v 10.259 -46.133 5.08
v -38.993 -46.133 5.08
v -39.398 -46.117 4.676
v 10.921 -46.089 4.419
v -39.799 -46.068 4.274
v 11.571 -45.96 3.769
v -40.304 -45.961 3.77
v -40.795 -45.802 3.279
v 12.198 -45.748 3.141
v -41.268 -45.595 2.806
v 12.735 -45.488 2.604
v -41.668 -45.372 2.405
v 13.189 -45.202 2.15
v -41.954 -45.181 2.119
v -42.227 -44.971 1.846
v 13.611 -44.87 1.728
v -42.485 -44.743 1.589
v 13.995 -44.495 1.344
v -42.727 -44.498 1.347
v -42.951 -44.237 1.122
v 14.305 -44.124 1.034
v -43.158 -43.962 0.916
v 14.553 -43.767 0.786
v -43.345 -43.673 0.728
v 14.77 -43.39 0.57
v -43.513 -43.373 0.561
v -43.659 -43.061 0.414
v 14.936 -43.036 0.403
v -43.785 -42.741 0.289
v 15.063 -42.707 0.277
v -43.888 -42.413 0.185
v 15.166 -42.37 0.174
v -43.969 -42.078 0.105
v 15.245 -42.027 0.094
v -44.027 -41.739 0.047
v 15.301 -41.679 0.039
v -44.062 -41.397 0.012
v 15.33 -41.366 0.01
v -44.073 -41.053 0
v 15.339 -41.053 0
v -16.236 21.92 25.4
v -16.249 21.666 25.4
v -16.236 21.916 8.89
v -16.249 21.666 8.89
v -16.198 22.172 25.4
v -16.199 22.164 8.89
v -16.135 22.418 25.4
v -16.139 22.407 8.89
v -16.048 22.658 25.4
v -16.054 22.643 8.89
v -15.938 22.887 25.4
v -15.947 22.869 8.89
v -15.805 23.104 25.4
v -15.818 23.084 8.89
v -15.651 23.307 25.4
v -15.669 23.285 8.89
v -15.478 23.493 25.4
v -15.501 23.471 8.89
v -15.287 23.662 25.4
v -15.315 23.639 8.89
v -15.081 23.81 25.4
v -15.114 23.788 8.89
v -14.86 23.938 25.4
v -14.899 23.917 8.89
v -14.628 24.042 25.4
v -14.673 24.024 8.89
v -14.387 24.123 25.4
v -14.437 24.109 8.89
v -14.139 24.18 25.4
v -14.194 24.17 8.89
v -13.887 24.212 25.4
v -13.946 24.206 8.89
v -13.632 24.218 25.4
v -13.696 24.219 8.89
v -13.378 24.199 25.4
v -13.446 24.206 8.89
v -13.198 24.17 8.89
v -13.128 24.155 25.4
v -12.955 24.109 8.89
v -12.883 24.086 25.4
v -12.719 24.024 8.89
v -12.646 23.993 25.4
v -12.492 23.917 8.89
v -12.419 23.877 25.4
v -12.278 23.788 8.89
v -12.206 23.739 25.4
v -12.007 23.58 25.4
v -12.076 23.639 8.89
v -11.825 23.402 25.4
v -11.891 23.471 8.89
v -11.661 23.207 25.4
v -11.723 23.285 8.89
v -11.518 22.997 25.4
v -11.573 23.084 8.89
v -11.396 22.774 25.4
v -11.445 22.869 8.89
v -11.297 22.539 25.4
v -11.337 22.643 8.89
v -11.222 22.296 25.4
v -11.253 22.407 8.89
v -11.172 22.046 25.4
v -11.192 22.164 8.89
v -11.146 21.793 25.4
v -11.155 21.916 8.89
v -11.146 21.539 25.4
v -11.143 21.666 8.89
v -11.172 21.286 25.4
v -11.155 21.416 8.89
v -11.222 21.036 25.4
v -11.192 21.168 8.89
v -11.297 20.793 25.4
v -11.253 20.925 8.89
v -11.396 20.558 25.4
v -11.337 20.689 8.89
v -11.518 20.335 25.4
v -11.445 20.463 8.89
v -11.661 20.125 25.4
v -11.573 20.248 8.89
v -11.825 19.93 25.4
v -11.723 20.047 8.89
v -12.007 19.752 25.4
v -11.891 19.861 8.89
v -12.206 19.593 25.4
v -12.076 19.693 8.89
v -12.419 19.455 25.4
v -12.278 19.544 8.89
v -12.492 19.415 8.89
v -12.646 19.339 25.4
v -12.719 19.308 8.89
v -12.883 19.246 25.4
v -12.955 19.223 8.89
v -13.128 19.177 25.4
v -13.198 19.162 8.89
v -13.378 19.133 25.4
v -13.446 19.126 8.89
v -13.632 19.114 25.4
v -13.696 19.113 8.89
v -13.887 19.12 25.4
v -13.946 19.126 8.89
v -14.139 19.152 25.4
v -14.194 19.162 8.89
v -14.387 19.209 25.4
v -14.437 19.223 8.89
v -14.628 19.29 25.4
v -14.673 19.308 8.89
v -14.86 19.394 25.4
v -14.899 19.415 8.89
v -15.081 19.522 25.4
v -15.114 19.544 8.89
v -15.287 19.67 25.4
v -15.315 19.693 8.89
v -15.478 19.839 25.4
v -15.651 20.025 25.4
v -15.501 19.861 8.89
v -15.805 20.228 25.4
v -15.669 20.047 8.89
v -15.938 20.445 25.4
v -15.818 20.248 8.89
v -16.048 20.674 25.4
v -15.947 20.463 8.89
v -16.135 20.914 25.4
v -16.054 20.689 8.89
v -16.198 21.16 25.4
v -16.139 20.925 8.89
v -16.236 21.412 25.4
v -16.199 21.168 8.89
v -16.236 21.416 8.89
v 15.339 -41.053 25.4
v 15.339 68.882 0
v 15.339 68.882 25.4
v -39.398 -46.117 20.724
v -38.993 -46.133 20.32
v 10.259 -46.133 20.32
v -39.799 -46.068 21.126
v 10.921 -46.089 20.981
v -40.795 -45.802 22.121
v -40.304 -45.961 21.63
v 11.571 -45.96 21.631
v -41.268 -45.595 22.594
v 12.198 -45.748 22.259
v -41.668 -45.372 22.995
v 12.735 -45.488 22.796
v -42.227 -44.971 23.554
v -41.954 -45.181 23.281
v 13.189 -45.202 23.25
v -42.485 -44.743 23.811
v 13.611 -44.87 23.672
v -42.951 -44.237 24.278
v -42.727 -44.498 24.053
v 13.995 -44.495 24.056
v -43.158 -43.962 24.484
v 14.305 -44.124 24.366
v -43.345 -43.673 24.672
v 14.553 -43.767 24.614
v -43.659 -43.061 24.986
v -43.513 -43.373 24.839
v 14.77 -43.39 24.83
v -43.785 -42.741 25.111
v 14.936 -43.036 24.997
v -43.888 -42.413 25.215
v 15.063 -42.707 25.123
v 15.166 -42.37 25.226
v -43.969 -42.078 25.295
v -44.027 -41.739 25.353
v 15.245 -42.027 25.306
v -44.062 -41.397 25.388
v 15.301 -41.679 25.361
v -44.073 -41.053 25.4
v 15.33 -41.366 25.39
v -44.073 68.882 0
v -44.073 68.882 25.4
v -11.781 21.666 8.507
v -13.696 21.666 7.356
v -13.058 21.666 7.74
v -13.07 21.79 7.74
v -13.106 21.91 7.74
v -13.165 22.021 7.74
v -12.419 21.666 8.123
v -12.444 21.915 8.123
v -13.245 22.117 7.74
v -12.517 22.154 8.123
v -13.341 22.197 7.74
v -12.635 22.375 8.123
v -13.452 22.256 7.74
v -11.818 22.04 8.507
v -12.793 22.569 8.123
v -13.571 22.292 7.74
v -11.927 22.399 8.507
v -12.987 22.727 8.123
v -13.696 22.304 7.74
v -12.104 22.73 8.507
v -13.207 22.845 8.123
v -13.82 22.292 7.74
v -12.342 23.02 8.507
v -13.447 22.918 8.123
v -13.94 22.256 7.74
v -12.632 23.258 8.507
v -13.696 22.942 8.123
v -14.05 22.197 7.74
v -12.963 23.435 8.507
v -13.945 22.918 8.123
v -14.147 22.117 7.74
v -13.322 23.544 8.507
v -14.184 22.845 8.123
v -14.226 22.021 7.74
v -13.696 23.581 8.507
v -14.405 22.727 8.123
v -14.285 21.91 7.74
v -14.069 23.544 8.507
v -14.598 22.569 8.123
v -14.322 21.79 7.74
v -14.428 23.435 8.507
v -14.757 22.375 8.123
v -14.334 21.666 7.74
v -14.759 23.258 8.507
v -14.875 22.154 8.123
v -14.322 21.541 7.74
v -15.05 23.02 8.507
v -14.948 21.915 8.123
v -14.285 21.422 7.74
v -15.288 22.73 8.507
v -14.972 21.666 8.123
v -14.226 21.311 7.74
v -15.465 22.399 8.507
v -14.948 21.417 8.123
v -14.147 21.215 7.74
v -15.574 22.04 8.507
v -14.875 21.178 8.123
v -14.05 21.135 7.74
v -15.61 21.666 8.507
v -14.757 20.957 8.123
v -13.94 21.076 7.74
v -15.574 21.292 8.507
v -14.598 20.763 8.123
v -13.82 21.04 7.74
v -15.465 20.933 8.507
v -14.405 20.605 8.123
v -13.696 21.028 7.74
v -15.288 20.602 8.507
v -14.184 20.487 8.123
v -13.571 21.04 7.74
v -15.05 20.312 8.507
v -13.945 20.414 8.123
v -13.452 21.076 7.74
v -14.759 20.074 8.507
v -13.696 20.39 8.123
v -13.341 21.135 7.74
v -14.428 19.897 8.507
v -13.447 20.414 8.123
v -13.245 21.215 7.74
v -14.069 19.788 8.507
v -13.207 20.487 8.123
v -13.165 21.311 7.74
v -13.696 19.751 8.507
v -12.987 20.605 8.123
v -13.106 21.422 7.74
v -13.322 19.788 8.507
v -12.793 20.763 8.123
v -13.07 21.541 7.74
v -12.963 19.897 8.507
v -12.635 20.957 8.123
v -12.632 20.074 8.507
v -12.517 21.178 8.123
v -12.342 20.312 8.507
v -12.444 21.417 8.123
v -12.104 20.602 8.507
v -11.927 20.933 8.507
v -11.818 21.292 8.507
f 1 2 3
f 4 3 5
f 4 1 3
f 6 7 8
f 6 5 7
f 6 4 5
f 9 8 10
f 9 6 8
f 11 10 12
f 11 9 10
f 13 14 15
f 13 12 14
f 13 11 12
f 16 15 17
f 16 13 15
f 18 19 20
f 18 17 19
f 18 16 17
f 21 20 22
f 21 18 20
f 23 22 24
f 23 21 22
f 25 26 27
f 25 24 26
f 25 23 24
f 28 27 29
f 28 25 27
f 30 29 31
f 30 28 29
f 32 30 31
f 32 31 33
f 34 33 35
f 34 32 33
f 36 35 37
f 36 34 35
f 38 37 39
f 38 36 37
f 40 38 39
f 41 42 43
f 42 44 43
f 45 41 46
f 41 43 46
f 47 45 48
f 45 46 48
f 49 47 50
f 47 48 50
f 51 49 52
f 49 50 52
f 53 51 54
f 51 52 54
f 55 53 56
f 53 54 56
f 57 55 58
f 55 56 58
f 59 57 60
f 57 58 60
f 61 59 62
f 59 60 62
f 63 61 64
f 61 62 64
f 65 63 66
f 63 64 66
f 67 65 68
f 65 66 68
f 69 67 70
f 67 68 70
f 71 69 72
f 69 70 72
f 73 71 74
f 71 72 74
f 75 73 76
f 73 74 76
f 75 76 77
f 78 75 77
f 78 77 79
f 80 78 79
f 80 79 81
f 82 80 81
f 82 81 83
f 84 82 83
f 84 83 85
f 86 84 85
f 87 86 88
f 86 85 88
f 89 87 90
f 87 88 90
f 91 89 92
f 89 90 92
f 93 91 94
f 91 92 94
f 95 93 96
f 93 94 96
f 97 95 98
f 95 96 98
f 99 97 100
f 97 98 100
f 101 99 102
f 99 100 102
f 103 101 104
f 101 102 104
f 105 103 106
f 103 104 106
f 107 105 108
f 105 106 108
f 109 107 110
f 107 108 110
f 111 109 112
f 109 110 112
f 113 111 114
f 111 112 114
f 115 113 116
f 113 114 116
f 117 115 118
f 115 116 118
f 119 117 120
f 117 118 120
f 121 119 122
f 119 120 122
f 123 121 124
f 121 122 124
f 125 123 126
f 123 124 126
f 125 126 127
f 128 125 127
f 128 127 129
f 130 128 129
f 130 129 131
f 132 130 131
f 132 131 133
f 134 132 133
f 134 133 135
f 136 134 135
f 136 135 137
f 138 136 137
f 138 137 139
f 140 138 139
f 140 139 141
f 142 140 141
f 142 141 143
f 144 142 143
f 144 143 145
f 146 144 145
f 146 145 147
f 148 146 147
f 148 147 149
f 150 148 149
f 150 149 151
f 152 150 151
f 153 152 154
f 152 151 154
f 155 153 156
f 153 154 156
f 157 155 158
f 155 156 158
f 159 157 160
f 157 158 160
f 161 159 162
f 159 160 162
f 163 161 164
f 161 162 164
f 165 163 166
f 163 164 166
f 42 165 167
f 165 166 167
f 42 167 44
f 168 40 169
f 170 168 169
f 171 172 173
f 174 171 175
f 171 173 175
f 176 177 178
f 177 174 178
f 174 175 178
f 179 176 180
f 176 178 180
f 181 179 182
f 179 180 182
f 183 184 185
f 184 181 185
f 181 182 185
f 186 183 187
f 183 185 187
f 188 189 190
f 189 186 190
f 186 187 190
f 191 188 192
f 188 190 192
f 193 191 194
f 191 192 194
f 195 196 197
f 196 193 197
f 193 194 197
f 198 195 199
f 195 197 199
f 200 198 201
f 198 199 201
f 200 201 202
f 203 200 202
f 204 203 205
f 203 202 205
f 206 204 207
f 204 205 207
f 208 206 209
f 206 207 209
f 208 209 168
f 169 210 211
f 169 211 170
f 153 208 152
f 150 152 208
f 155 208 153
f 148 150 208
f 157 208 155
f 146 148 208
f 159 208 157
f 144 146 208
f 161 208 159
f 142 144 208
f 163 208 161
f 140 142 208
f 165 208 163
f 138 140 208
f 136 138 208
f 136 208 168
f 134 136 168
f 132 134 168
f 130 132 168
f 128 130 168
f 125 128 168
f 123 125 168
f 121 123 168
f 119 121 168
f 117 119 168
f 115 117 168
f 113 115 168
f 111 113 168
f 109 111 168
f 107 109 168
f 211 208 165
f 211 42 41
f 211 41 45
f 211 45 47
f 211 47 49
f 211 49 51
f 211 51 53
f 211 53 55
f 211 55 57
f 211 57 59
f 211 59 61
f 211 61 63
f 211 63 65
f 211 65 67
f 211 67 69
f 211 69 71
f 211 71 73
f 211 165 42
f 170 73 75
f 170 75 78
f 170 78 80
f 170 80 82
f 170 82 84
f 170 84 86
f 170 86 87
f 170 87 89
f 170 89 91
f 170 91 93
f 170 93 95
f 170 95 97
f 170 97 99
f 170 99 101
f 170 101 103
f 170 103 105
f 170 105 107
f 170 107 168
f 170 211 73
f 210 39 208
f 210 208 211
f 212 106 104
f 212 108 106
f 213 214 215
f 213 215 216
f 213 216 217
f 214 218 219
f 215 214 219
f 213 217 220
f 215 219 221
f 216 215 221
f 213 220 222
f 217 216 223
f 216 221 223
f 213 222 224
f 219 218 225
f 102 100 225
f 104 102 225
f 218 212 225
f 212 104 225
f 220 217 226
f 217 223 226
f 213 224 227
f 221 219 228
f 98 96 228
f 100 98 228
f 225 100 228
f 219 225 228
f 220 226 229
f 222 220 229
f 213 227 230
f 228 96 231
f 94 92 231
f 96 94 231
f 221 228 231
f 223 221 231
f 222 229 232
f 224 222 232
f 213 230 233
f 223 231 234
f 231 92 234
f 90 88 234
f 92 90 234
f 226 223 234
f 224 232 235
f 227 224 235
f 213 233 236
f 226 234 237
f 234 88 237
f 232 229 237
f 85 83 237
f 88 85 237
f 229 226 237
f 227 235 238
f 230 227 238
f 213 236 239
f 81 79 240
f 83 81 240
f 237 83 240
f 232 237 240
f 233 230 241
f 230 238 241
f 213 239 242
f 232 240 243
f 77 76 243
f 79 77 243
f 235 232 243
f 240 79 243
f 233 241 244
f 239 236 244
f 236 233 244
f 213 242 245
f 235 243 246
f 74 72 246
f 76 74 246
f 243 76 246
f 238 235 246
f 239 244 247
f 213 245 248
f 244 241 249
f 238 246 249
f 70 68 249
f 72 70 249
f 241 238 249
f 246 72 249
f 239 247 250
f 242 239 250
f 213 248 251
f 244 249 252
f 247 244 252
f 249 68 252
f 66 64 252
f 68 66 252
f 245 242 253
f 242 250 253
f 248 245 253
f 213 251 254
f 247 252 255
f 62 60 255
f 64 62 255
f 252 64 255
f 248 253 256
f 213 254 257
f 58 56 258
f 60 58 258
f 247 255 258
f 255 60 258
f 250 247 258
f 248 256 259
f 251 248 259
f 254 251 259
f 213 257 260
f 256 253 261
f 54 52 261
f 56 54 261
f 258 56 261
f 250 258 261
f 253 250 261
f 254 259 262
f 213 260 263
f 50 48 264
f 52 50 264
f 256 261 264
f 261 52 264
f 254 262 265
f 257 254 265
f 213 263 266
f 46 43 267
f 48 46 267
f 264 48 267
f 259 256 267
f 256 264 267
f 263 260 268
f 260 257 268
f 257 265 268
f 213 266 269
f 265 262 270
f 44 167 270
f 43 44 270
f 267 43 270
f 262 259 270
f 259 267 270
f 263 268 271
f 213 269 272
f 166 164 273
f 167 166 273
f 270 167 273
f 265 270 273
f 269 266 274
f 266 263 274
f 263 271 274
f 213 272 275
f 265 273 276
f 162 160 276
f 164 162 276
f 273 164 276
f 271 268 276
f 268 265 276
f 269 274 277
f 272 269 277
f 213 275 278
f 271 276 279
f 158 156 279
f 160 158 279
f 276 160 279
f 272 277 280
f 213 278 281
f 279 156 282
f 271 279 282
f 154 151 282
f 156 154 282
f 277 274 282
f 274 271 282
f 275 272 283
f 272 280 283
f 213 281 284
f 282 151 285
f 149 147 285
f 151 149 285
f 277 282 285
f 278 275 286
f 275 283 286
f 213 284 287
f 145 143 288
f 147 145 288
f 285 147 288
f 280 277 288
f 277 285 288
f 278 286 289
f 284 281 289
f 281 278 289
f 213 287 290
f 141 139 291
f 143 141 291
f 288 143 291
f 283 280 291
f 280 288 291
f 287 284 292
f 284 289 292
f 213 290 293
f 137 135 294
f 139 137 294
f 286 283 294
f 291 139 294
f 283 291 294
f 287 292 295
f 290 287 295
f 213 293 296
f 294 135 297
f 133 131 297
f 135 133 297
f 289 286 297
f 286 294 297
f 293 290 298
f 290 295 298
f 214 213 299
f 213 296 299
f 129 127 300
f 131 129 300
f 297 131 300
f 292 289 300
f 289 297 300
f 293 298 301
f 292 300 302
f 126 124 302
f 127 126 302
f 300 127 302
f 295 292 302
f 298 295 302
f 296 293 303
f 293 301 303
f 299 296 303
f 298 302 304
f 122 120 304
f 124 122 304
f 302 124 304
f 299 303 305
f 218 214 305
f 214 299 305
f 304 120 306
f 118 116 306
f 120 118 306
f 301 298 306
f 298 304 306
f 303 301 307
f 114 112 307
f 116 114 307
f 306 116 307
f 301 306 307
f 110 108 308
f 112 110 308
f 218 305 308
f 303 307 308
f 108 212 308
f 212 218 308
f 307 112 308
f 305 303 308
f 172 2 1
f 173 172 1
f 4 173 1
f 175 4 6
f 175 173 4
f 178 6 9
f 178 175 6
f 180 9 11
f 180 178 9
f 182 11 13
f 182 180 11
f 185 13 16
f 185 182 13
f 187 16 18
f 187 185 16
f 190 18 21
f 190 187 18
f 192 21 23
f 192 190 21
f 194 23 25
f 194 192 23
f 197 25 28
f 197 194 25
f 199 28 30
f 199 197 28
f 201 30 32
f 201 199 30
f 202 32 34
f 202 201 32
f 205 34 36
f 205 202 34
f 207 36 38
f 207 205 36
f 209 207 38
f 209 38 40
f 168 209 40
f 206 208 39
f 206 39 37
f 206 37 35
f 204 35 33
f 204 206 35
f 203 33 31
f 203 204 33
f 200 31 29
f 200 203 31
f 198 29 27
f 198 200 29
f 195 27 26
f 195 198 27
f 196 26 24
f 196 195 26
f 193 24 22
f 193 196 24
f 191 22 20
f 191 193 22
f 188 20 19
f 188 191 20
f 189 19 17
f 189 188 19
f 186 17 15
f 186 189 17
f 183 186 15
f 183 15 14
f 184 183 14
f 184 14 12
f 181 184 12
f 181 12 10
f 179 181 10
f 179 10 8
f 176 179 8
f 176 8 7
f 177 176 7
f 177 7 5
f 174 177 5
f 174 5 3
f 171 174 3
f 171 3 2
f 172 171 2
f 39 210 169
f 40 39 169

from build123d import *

# Parameters (mm, degrees)
F0_W     = 59.4127969816
F0_H     = 115.0143891573
F1_DEPTH = 25.4
F2_R     = 5.08
F4_D     = 5.1054
F4_DEPTH = 16.51
F4_TIP   = 1.5338169022


with BuildPart() as f1:
    # F0 (on Top) → F1 (new body)
    with BuildSketch(Plane.XY):
        with Locations((-14.3670565449, 11.3745853305)):
            Rectangle(F0_W, F0_H)
    extrude(amount=F1_DEPTH)

    # F2
    f2_edges = [f1.edges().sort_by_distance(p)[0] for p in [
        (-44.073455, -46.132609, 12.7),
        (-14.367057, -46.132609, 25.4),
        (15.339342, -46.132609, 12.7),
        (-14.367057, -46.132609, 0),
    ]]
    fillet(f2_edges, radius=F2_R)

    # F4
    with Locations(Plane.XY.offset(25.4)):
        with Locations((-13.6958118528, 21.6659959406)):
            Hole(F4_D / 2, depth=F4_DEPTH)
            with Locations((0, 0, -(F4_DEPTH + F4_TIP / 2))):  # 118° drill point
                Cone(0, F4_D / 2, F4_TIP, mode=Mode.SUBTRACT)


solid = f1.part
